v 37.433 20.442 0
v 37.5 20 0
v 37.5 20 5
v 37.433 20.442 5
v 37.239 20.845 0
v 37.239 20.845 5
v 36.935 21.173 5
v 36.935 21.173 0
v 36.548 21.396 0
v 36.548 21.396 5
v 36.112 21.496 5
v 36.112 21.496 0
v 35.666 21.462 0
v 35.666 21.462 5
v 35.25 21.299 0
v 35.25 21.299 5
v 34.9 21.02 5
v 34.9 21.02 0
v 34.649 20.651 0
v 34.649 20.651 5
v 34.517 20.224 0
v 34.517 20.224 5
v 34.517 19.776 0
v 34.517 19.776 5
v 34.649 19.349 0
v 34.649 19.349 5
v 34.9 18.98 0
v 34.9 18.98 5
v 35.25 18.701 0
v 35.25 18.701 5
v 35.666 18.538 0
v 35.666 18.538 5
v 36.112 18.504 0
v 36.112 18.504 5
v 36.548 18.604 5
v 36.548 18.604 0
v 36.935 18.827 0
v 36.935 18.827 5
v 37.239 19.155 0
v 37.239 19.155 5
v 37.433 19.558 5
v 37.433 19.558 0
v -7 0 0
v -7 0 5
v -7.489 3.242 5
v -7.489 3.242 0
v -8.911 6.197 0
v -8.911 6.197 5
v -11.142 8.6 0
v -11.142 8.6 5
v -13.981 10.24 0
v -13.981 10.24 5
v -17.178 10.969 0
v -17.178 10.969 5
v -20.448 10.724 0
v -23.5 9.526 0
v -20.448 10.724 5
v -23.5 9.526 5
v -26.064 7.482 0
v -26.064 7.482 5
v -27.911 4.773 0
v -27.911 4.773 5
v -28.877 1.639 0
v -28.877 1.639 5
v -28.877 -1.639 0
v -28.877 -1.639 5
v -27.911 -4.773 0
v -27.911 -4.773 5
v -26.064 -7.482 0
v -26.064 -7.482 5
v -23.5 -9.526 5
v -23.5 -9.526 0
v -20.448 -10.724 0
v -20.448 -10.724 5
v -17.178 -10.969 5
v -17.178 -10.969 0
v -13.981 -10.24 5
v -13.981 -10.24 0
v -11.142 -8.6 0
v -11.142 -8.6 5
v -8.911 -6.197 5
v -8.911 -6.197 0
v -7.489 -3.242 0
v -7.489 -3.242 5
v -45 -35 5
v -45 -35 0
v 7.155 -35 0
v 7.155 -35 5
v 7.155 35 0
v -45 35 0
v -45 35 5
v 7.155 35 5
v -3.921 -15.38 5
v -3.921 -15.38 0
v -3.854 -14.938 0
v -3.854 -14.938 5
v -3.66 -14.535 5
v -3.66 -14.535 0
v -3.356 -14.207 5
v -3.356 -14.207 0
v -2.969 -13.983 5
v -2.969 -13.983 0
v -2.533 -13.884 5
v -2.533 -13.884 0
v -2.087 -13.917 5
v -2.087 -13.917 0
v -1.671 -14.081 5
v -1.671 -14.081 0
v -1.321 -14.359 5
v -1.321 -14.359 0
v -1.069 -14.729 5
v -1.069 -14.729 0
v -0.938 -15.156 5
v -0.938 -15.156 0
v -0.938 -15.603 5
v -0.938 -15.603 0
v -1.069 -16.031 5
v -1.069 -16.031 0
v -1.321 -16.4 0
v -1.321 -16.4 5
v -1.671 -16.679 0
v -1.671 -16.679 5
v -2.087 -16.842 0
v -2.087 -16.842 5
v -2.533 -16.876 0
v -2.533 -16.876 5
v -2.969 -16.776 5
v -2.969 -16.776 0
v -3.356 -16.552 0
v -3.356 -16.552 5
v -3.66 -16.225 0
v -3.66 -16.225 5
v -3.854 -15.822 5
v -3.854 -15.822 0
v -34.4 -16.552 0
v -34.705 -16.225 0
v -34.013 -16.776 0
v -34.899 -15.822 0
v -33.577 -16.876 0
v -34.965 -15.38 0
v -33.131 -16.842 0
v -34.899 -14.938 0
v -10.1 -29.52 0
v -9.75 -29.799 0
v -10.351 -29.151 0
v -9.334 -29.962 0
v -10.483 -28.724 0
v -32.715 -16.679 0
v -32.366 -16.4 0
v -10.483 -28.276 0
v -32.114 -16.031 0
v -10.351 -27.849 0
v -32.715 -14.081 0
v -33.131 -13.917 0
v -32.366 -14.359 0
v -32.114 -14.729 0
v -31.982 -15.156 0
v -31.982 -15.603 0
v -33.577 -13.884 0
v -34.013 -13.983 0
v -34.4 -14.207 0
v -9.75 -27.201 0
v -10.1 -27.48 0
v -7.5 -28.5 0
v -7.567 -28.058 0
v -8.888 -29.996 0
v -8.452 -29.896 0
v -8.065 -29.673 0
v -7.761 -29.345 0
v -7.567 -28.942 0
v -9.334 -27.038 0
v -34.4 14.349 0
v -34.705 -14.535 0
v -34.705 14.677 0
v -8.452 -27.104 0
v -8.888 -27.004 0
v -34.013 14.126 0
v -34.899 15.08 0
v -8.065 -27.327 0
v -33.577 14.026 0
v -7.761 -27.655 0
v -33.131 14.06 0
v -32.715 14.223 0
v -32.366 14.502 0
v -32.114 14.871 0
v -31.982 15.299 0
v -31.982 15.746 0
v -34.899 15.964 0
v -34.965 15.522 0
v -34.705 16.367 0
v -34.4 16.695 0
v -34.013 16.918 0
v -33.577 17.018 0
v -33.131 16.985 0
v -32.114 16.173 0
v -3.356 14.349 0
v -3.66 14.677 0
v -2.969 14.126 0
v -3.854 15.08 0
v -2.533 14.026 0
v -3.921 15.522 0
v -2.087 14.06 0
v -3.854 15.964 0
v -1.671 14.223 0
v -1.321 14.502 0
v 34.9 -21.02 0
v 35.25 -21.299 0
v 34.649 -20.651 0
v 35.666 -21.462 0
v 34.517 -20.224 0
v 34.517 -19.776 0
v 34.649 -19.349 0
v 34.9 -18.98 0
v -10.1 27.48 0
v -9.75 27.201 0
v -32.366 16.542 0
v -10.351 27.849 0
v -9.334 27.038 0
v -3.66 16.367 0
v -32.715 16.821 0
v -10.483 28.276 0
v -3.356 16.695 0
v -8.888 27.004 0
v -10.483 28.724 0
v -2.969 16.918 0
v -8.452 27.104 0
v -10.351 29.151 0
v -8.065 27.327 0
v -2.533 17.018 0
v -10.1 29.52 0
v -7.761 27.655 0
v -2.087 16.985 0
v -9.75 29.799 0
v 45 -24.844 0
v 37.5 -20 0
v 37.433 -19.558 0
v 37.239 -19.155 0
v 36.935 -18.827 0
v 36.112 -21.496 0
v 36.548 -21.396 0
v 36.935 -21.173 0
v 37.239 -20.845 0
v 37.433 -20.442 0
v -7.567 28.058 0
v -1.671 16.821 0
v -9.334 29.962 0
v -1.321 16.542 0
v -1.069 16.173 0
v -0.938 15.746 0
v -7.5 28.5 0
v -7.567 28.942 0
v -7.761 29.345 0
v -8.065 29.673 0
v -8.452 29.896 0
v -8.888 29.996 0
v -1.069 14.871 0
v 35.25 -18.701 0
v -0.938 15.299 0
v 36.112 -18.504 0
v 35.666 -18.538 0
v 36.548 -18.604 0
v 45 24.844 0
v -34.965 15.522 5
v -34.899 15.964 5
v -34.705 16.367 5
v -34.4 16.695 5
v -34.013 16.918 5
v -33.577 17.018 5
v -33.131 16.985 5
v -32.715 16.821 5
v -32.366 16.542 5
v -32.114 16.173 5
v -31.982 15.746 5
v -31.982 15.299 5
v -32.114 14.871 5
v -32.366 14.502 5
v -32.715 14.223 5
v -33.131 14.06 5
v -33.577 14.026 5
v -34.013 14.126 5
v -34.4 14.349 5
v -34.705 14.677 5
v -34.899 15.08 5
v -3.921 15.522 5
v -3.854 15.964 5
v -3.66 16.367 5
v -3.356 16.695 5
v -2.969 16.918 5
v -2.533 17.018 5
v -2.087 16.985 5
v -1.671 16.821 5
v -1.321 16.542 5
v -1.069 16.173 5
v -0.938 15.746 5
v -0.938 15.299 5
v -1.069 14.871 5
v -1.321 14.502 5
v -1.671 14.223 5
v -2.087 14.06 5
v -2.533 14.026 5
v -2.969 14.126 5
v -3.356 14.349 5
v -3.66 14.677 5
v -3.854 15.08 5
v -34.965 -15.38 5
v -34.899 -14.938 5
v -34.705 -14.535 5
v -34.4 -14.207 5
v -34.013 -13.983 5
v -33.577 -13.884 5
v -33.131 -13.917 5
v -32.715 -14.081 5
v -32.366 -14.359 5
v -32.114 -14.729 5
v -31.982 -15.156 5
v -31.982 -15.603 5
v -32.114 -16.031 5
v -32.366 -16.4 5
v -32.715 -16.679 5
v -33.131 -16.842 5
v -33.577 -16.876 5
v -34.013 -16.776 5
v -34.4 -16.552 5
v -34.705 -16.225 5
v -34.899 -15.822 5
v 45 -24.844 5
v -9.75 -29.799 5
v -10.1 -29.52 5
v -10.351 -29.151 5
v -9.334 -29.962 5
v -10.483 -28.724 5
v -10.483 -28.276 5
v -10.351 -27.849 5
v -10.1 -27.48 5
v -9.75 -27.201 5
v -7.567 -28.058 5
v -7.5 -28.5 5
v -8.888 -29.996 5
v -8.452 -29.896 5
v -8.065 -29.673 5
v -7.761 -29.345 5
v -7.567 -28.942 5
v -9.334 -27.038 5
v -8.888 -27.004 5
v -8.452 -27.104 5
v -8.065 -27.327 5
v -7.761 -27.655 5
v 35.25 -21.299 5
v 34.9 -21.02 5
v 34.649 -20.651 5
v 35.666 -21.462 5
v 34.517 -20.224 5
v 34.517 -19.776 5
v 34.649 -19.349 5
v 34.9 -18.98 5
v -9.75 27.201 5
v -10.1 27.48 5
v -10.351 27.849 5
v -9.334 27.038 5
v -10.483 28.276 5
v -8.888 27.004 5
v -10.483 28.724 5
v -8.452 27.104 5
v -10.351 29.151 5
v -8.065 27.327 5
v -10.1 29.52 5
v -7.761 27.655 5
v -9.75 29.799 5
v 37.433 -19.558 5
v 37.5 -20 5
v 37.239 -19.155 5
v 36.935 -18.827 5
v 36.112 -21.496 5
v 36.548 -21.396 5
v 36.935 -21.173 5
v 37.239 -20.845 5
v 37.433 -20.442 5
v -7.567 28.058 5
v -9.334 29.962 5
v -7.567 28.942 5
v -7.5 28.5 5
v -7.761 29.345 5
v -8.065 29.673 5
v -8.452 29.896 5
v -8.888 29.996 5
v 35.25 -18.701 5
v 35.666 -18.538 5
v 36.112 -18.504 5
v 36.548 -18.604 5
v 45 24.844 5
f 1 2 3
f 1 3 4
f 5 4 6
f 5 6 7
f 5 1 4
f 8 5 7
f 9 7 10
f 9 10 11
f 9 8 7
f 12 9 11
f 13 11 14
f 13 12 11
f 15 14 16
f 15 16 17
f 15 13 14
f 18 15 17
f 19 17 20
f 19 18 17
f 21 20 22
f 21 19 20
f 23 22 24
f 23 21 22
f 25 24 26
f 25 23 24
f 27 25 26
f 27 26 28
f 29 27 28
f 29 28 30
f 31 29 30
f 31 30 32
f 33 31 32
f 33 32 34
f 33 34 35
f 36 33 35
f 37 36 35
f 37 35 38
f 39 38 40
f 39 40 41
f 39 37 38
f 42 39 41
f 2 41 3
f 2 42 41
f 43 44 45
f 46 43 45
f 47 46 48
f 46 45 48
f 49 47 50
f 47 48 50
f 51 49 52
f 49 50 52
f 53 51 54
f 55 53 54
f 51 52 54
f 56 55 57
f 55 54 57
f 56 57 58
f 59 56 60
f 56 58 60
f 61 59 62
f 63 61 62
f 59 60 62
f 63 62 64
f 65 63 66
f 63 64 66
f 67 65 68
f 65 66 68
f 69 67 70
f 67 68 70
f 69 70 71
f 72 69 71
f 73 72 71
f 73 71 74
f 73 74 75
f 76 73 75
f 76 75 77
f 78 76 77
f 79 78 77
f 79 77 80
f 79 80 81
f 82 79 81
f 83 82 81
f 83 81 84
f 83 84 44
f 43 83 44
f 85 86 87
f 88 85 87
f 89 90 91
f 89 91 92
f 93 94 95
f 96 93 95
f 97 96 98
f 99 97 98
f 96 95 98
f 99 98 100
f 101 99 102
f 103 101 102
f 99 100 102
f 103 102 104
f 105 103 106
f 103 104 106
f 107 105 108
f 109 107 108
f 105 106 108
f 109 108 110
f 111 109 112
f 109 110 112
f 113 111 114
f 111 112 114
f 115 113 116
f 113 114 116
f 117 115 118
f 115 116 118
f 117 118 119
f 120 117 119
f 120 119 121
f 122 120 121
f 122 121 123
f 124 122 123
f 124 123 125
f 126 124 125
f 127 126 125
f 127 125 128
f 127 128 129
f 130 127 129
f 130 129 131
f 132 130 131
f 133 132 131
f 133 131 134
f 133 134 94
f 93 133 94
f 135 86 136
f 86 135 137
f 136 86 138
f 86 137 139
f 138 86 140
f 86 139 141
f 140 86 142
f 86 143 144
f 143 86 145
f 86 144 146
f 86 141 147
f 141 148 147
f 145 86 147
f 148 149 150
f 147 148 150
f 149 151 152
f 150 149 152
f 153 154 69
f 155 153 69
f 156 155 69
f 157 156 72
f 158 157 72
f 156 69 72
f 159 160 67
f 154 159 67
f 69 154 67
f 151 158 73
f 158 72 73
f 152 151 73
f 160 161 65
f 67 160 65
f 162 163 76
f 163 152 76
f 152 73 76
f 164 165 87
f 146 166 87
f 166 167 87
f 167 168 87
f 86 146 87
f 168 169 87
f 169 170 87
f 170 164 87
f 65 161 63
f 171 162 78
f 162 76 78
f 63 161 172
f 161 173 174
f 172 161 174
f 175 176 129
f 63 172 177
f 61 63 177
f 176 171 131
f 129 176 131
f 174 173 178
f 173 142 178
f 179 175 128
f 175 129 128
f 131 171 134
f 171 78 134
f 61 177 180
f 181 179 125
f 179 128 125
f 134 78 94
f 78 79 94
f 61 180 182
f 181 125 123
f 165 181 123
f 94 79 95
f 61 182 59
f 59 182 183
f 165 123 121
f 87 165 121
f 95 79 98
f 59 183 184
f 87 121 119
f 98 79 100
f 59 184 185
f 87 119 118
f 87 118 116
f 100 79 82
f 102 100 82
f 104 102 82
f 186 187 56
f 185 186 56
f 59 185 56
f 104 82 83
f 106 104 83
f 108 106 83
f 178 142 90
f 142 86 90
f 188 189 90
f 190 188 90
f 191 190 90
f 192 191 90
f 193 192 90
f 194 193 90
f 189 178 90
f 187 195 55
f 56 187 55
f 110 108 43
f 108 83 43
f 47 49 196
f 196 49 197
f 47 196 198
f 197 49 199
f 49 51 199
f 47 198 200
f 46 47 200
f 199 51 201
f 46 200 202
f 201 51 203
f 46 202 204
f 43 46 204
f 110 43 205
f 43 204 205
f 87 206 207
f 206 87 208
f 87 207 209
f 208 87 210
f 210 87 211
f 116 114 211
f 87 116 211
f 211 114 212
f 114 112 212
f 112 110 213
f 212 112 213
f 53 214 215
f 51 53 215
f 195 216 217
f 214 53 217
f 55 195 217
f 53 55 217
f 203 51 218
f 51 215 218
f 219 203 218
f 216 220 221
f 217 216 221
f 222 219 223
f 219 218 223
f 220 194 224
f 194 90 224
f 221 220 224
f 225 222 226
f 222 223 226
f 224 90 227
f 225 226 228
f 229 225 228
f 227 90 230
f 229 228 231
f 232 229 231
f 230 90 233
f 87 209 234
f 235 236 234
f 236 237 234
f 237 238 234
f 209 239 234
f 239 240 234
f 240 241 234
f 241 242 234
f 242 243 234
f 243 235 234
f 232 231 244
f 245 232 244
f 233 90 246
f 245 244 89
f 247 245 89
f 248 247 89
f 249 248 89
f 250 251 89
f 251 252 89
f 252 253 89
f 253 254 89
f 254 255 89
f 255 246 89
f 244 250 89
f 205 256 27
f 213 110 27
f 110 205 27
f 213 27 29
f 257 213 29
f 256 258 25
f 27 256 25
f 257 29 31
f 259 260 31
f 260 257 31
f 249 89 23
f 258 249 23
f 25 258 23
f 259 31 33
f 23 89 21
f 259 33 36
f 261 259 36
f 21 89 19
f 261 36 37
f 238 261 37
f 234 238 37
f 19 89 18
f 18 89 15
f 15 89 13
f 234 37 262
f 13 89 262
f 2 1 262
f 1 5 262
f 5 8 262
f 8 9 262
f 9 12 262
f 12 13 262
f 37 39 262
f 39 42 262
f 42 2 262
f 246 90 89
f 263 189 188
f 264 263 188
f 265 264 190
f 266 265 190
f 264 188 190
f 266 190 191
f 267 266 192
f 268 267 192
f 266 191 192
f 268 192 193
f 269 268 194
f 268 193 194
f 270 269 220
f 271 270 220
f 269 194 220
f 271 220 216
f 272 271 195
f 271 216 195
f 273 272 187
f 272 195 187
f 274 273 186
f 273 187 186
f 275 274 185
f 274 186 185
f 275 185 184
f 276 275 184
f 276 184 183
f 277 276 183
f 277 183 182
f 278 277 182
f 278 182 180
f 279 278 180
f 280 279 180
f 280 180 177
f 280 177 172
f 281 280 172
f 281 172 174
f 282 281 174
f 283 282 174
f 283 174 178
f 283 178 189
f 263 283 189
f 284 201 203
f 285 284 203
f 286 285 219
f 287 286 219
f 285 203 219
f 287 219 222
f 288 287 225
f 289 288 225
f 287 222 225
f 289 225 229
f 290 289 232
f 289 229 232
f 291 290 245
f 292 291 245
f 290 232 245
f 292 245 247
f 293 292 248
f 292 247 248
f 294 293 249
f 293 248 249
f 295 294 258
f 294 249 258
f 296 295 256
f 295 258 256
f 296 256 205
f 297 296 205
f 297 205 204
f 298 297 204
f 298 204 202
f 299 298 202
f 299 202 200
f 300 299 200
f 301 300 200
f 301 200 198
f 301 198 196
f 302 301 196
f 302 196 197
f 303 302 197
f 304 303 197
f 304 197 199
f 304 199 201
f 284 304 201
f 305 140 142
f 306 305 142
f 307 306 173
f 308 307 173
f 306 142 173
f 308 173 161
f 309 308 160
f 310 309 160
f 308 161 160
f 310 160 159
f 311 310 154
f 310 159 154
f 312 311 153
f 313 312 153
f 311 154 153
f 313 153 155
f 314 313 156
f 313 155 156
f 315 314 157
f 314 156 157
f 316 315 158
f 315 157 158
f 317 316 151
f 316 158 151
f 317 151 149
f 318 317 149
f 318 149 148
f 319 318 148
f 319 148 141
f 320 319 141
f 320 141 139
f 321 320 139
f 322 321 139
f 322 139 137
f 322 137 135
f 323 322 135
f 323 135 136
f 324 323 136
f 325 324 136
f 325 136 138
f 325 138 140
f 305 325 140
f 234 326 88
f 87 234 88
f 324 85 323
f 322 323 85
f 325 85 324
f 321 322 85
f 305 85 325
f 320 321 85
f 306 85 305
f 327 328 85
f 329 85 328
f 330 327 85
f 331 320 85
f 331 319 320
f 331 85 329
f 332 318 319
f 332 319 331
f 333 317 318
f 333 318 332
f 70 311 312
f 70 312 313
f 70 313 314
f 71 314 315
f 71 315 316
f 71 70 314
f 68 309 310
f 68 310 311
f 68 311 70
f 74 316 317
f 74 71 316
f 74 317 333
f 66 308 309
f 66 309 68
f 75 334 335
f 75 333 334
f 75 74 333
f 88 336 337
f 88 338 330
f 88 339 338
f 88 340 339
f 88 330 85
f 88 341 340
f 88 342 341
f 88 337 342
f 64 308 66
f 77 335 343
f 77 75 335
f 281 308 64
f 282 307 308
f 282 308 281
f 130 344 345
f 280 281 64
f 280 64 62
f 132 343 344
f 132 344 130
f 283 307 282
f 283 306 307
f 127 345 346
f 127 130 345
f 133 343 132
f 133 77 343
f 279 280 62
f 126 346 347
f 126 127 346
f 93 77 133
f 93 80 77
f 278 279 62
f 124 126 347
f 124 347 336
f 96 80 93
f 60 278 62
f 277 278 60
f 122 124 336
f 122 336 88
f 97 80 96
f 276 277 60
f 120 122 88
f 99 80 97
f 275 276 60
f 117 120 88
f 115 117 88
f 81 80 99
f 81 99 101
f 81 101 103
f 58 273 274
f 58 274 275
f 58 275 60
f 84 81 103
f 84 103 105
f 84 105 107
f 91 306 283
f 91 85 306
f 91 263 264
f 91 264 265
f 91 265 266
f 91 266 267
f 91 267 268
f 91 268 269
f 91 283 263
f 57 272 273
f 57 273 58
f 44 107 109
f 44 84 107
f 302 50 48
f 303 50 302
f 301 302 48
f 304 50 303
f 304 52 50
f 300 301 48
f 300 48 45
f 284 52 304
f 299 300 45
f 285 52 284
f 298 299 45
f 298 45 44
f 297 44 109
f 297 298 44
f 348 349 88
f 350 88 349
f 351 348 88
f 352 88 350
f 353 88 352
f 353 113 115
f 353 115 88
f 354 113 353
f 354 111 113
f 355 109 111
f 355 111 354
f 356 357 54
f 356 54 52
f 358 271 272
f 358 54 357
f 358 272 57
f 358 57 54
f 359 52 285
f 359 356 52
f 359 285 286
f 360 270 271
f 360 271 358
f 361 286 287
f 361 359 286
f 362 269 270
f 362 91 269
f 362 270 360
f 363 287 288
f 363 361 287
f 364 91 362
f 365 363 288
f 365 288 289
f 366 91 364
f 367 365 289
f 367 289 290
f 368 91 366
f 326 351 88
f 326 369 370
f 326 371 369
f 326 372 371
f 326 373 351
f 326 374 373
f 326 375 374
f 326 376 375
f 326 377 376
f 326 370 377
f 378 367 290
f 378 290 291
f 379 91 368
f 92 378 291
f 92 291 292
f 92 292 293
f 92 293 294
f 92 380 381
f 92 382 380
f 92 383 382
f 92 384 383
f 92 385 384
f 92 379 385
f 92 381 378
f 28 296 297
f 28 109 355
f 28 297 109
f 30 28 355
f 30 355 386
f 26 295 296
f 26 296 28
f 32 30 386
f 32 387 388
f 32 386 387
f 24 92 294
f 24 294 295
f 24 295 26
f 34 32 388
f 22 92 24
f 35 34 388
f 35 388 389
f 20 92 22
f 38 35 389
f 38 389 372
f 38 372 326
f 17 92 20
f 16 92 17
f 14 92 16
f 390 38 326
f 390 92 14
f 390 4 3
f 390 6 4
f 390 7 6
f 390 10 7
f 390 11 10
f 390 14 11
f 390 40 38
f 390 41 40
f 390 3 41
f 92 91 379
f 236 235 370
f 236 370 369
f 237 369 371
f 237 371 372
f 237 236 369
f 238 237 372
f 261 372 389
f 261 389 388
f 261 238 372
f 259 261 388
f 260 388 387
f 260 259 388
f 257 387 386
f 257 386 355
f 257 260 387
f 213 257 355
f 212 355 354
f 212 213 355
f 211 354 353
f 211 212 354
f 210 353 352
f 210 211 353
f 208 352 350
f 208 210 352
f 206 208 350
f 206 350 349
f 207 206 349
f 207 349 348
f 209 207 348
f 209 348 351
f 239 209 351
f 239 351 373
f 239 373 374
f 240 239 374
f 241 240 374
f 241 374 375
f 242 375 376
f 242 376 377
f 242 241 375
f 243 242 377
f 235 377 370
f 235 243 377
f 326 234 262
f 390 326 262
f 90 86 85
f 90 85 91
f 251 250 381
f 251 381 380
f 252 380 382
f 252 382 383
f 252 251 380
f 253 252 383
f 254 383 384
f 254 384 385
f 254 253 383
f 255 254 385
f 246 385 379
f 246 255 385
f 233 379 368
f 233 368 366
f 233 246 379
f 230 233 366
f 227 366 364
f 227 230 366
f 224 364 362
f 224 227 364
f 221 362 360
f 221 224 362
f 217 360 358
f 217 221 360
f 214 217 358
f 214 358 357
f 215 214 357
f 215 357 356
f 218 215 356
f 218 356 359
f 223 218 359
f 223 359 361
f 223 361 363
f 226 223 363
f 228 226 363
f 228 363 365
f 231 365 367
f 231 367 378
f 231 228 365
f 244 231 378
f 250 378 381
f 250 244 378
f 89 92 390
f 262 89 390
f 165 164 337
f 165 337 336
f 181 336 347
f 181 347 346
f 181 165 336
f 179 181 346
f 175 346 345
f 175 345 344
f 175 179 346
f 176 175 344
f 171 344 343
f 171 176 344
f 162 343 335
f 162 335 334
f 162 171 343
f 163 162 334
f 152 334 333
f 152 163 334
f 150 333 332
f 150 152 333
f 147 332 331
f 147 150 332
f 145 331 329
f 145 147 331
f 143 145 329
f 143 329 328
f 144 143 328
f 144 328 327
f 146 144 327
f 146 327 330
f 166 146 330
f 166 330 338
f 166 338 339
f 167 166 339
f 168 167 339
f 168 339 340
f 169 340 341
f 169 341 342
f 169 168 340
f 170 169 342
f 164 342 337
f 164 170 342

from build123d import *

# Parameters (mm, degrees)
F0_W      = 90
F0_H      = 70
F0_R      = 1.5
F2_DEPTH  = 5
F4_D      = 3
F5_D      = 11.5
F7_DEPTH  = 5
F9_DEPTH  = 0.1
F10_R     = 11
F10_R_2   = 5.75
F11_DEPTH = 5.001
F13_DEPTH = 5.001


with BuildPart() as f2:
    # F0 (on Top) → F2 (new body)
    with BuildSketch(Plane.XY):
        Rectangle(F0_W, F0_H)
        with Locations((-9, -28.5)):
            Circle(F0_R, mode=Mode.SUBTRACT)
        with Locations((36, -20)):
            Circle(F0_R, mode=Mode.SUBTRACT)
        with Locations((-9, 28.5)):
            Circle(F0_R, mode=Mode.SUBTRACT)
        with Locations((36, 20)):
            Circle(F0_R, mode=Mode.SUBTRACT)
    extrude(amount=F2_DEPTH)

    # F4 (through all)
    with Locations(Plane.XY.offset(5)):
        with Locations((-2.420886, 15.522152), (-2.420886, -15.379748), (-33.465192, -15.379748), (-33.465192, 15.522152)):
            Hole(F4_D / 2)

    # F5 (through all)
    with Locations(Plane(origin=(0, 0, 0), x_dir=(1, 0, 0), z_dir=(0, 0, -1))):
        with Locations((-18, 0)):
            Hole(F5_D / 2)

    # F6 (on face) → F7 (cut)
    with BuildSketch(Plane.XY.offset(5)):
        Polygon((7.15526, 35), (45, 24.844227), (45, 35), align=None)
    extrude(amount=-F7_DEPTH, mode=Mode.SUBTRACT)

    # F8 (on face) → F9 (cut)
    with BuildSketch(Plane.XY.offset(5)):
        Polygon((45, -25.128944), (7.019877, -35), (45, -35), align=None)
    extrude(amount=F9_DEPTH, mode=Mode.SUBTRACT)

    # F10 (on face) → F11 (cut, through all)
    with BuildSketch(Plane.XY.offset(5)):
        with Locations((-18, 0)):
            Circle(F10_R)
        with Locations((-18, 0)):
            Circle(F10_R_2, mode=Mode.SUBTRACT)
    extrude(amount=-F11_DEPTH, mode=Mode.SUBTRACT)

    # F12 (on face) → F13 (cut, through all)
    with BuildSketch(Plane.XY.offset(5)):
        Polygon((45, -24.844), (7.15526, -35), (45, -35), align=None)
    extrude(amount=-F13_DEPTH, mode=Mode.SUBTRACT)


solid = f2.part
